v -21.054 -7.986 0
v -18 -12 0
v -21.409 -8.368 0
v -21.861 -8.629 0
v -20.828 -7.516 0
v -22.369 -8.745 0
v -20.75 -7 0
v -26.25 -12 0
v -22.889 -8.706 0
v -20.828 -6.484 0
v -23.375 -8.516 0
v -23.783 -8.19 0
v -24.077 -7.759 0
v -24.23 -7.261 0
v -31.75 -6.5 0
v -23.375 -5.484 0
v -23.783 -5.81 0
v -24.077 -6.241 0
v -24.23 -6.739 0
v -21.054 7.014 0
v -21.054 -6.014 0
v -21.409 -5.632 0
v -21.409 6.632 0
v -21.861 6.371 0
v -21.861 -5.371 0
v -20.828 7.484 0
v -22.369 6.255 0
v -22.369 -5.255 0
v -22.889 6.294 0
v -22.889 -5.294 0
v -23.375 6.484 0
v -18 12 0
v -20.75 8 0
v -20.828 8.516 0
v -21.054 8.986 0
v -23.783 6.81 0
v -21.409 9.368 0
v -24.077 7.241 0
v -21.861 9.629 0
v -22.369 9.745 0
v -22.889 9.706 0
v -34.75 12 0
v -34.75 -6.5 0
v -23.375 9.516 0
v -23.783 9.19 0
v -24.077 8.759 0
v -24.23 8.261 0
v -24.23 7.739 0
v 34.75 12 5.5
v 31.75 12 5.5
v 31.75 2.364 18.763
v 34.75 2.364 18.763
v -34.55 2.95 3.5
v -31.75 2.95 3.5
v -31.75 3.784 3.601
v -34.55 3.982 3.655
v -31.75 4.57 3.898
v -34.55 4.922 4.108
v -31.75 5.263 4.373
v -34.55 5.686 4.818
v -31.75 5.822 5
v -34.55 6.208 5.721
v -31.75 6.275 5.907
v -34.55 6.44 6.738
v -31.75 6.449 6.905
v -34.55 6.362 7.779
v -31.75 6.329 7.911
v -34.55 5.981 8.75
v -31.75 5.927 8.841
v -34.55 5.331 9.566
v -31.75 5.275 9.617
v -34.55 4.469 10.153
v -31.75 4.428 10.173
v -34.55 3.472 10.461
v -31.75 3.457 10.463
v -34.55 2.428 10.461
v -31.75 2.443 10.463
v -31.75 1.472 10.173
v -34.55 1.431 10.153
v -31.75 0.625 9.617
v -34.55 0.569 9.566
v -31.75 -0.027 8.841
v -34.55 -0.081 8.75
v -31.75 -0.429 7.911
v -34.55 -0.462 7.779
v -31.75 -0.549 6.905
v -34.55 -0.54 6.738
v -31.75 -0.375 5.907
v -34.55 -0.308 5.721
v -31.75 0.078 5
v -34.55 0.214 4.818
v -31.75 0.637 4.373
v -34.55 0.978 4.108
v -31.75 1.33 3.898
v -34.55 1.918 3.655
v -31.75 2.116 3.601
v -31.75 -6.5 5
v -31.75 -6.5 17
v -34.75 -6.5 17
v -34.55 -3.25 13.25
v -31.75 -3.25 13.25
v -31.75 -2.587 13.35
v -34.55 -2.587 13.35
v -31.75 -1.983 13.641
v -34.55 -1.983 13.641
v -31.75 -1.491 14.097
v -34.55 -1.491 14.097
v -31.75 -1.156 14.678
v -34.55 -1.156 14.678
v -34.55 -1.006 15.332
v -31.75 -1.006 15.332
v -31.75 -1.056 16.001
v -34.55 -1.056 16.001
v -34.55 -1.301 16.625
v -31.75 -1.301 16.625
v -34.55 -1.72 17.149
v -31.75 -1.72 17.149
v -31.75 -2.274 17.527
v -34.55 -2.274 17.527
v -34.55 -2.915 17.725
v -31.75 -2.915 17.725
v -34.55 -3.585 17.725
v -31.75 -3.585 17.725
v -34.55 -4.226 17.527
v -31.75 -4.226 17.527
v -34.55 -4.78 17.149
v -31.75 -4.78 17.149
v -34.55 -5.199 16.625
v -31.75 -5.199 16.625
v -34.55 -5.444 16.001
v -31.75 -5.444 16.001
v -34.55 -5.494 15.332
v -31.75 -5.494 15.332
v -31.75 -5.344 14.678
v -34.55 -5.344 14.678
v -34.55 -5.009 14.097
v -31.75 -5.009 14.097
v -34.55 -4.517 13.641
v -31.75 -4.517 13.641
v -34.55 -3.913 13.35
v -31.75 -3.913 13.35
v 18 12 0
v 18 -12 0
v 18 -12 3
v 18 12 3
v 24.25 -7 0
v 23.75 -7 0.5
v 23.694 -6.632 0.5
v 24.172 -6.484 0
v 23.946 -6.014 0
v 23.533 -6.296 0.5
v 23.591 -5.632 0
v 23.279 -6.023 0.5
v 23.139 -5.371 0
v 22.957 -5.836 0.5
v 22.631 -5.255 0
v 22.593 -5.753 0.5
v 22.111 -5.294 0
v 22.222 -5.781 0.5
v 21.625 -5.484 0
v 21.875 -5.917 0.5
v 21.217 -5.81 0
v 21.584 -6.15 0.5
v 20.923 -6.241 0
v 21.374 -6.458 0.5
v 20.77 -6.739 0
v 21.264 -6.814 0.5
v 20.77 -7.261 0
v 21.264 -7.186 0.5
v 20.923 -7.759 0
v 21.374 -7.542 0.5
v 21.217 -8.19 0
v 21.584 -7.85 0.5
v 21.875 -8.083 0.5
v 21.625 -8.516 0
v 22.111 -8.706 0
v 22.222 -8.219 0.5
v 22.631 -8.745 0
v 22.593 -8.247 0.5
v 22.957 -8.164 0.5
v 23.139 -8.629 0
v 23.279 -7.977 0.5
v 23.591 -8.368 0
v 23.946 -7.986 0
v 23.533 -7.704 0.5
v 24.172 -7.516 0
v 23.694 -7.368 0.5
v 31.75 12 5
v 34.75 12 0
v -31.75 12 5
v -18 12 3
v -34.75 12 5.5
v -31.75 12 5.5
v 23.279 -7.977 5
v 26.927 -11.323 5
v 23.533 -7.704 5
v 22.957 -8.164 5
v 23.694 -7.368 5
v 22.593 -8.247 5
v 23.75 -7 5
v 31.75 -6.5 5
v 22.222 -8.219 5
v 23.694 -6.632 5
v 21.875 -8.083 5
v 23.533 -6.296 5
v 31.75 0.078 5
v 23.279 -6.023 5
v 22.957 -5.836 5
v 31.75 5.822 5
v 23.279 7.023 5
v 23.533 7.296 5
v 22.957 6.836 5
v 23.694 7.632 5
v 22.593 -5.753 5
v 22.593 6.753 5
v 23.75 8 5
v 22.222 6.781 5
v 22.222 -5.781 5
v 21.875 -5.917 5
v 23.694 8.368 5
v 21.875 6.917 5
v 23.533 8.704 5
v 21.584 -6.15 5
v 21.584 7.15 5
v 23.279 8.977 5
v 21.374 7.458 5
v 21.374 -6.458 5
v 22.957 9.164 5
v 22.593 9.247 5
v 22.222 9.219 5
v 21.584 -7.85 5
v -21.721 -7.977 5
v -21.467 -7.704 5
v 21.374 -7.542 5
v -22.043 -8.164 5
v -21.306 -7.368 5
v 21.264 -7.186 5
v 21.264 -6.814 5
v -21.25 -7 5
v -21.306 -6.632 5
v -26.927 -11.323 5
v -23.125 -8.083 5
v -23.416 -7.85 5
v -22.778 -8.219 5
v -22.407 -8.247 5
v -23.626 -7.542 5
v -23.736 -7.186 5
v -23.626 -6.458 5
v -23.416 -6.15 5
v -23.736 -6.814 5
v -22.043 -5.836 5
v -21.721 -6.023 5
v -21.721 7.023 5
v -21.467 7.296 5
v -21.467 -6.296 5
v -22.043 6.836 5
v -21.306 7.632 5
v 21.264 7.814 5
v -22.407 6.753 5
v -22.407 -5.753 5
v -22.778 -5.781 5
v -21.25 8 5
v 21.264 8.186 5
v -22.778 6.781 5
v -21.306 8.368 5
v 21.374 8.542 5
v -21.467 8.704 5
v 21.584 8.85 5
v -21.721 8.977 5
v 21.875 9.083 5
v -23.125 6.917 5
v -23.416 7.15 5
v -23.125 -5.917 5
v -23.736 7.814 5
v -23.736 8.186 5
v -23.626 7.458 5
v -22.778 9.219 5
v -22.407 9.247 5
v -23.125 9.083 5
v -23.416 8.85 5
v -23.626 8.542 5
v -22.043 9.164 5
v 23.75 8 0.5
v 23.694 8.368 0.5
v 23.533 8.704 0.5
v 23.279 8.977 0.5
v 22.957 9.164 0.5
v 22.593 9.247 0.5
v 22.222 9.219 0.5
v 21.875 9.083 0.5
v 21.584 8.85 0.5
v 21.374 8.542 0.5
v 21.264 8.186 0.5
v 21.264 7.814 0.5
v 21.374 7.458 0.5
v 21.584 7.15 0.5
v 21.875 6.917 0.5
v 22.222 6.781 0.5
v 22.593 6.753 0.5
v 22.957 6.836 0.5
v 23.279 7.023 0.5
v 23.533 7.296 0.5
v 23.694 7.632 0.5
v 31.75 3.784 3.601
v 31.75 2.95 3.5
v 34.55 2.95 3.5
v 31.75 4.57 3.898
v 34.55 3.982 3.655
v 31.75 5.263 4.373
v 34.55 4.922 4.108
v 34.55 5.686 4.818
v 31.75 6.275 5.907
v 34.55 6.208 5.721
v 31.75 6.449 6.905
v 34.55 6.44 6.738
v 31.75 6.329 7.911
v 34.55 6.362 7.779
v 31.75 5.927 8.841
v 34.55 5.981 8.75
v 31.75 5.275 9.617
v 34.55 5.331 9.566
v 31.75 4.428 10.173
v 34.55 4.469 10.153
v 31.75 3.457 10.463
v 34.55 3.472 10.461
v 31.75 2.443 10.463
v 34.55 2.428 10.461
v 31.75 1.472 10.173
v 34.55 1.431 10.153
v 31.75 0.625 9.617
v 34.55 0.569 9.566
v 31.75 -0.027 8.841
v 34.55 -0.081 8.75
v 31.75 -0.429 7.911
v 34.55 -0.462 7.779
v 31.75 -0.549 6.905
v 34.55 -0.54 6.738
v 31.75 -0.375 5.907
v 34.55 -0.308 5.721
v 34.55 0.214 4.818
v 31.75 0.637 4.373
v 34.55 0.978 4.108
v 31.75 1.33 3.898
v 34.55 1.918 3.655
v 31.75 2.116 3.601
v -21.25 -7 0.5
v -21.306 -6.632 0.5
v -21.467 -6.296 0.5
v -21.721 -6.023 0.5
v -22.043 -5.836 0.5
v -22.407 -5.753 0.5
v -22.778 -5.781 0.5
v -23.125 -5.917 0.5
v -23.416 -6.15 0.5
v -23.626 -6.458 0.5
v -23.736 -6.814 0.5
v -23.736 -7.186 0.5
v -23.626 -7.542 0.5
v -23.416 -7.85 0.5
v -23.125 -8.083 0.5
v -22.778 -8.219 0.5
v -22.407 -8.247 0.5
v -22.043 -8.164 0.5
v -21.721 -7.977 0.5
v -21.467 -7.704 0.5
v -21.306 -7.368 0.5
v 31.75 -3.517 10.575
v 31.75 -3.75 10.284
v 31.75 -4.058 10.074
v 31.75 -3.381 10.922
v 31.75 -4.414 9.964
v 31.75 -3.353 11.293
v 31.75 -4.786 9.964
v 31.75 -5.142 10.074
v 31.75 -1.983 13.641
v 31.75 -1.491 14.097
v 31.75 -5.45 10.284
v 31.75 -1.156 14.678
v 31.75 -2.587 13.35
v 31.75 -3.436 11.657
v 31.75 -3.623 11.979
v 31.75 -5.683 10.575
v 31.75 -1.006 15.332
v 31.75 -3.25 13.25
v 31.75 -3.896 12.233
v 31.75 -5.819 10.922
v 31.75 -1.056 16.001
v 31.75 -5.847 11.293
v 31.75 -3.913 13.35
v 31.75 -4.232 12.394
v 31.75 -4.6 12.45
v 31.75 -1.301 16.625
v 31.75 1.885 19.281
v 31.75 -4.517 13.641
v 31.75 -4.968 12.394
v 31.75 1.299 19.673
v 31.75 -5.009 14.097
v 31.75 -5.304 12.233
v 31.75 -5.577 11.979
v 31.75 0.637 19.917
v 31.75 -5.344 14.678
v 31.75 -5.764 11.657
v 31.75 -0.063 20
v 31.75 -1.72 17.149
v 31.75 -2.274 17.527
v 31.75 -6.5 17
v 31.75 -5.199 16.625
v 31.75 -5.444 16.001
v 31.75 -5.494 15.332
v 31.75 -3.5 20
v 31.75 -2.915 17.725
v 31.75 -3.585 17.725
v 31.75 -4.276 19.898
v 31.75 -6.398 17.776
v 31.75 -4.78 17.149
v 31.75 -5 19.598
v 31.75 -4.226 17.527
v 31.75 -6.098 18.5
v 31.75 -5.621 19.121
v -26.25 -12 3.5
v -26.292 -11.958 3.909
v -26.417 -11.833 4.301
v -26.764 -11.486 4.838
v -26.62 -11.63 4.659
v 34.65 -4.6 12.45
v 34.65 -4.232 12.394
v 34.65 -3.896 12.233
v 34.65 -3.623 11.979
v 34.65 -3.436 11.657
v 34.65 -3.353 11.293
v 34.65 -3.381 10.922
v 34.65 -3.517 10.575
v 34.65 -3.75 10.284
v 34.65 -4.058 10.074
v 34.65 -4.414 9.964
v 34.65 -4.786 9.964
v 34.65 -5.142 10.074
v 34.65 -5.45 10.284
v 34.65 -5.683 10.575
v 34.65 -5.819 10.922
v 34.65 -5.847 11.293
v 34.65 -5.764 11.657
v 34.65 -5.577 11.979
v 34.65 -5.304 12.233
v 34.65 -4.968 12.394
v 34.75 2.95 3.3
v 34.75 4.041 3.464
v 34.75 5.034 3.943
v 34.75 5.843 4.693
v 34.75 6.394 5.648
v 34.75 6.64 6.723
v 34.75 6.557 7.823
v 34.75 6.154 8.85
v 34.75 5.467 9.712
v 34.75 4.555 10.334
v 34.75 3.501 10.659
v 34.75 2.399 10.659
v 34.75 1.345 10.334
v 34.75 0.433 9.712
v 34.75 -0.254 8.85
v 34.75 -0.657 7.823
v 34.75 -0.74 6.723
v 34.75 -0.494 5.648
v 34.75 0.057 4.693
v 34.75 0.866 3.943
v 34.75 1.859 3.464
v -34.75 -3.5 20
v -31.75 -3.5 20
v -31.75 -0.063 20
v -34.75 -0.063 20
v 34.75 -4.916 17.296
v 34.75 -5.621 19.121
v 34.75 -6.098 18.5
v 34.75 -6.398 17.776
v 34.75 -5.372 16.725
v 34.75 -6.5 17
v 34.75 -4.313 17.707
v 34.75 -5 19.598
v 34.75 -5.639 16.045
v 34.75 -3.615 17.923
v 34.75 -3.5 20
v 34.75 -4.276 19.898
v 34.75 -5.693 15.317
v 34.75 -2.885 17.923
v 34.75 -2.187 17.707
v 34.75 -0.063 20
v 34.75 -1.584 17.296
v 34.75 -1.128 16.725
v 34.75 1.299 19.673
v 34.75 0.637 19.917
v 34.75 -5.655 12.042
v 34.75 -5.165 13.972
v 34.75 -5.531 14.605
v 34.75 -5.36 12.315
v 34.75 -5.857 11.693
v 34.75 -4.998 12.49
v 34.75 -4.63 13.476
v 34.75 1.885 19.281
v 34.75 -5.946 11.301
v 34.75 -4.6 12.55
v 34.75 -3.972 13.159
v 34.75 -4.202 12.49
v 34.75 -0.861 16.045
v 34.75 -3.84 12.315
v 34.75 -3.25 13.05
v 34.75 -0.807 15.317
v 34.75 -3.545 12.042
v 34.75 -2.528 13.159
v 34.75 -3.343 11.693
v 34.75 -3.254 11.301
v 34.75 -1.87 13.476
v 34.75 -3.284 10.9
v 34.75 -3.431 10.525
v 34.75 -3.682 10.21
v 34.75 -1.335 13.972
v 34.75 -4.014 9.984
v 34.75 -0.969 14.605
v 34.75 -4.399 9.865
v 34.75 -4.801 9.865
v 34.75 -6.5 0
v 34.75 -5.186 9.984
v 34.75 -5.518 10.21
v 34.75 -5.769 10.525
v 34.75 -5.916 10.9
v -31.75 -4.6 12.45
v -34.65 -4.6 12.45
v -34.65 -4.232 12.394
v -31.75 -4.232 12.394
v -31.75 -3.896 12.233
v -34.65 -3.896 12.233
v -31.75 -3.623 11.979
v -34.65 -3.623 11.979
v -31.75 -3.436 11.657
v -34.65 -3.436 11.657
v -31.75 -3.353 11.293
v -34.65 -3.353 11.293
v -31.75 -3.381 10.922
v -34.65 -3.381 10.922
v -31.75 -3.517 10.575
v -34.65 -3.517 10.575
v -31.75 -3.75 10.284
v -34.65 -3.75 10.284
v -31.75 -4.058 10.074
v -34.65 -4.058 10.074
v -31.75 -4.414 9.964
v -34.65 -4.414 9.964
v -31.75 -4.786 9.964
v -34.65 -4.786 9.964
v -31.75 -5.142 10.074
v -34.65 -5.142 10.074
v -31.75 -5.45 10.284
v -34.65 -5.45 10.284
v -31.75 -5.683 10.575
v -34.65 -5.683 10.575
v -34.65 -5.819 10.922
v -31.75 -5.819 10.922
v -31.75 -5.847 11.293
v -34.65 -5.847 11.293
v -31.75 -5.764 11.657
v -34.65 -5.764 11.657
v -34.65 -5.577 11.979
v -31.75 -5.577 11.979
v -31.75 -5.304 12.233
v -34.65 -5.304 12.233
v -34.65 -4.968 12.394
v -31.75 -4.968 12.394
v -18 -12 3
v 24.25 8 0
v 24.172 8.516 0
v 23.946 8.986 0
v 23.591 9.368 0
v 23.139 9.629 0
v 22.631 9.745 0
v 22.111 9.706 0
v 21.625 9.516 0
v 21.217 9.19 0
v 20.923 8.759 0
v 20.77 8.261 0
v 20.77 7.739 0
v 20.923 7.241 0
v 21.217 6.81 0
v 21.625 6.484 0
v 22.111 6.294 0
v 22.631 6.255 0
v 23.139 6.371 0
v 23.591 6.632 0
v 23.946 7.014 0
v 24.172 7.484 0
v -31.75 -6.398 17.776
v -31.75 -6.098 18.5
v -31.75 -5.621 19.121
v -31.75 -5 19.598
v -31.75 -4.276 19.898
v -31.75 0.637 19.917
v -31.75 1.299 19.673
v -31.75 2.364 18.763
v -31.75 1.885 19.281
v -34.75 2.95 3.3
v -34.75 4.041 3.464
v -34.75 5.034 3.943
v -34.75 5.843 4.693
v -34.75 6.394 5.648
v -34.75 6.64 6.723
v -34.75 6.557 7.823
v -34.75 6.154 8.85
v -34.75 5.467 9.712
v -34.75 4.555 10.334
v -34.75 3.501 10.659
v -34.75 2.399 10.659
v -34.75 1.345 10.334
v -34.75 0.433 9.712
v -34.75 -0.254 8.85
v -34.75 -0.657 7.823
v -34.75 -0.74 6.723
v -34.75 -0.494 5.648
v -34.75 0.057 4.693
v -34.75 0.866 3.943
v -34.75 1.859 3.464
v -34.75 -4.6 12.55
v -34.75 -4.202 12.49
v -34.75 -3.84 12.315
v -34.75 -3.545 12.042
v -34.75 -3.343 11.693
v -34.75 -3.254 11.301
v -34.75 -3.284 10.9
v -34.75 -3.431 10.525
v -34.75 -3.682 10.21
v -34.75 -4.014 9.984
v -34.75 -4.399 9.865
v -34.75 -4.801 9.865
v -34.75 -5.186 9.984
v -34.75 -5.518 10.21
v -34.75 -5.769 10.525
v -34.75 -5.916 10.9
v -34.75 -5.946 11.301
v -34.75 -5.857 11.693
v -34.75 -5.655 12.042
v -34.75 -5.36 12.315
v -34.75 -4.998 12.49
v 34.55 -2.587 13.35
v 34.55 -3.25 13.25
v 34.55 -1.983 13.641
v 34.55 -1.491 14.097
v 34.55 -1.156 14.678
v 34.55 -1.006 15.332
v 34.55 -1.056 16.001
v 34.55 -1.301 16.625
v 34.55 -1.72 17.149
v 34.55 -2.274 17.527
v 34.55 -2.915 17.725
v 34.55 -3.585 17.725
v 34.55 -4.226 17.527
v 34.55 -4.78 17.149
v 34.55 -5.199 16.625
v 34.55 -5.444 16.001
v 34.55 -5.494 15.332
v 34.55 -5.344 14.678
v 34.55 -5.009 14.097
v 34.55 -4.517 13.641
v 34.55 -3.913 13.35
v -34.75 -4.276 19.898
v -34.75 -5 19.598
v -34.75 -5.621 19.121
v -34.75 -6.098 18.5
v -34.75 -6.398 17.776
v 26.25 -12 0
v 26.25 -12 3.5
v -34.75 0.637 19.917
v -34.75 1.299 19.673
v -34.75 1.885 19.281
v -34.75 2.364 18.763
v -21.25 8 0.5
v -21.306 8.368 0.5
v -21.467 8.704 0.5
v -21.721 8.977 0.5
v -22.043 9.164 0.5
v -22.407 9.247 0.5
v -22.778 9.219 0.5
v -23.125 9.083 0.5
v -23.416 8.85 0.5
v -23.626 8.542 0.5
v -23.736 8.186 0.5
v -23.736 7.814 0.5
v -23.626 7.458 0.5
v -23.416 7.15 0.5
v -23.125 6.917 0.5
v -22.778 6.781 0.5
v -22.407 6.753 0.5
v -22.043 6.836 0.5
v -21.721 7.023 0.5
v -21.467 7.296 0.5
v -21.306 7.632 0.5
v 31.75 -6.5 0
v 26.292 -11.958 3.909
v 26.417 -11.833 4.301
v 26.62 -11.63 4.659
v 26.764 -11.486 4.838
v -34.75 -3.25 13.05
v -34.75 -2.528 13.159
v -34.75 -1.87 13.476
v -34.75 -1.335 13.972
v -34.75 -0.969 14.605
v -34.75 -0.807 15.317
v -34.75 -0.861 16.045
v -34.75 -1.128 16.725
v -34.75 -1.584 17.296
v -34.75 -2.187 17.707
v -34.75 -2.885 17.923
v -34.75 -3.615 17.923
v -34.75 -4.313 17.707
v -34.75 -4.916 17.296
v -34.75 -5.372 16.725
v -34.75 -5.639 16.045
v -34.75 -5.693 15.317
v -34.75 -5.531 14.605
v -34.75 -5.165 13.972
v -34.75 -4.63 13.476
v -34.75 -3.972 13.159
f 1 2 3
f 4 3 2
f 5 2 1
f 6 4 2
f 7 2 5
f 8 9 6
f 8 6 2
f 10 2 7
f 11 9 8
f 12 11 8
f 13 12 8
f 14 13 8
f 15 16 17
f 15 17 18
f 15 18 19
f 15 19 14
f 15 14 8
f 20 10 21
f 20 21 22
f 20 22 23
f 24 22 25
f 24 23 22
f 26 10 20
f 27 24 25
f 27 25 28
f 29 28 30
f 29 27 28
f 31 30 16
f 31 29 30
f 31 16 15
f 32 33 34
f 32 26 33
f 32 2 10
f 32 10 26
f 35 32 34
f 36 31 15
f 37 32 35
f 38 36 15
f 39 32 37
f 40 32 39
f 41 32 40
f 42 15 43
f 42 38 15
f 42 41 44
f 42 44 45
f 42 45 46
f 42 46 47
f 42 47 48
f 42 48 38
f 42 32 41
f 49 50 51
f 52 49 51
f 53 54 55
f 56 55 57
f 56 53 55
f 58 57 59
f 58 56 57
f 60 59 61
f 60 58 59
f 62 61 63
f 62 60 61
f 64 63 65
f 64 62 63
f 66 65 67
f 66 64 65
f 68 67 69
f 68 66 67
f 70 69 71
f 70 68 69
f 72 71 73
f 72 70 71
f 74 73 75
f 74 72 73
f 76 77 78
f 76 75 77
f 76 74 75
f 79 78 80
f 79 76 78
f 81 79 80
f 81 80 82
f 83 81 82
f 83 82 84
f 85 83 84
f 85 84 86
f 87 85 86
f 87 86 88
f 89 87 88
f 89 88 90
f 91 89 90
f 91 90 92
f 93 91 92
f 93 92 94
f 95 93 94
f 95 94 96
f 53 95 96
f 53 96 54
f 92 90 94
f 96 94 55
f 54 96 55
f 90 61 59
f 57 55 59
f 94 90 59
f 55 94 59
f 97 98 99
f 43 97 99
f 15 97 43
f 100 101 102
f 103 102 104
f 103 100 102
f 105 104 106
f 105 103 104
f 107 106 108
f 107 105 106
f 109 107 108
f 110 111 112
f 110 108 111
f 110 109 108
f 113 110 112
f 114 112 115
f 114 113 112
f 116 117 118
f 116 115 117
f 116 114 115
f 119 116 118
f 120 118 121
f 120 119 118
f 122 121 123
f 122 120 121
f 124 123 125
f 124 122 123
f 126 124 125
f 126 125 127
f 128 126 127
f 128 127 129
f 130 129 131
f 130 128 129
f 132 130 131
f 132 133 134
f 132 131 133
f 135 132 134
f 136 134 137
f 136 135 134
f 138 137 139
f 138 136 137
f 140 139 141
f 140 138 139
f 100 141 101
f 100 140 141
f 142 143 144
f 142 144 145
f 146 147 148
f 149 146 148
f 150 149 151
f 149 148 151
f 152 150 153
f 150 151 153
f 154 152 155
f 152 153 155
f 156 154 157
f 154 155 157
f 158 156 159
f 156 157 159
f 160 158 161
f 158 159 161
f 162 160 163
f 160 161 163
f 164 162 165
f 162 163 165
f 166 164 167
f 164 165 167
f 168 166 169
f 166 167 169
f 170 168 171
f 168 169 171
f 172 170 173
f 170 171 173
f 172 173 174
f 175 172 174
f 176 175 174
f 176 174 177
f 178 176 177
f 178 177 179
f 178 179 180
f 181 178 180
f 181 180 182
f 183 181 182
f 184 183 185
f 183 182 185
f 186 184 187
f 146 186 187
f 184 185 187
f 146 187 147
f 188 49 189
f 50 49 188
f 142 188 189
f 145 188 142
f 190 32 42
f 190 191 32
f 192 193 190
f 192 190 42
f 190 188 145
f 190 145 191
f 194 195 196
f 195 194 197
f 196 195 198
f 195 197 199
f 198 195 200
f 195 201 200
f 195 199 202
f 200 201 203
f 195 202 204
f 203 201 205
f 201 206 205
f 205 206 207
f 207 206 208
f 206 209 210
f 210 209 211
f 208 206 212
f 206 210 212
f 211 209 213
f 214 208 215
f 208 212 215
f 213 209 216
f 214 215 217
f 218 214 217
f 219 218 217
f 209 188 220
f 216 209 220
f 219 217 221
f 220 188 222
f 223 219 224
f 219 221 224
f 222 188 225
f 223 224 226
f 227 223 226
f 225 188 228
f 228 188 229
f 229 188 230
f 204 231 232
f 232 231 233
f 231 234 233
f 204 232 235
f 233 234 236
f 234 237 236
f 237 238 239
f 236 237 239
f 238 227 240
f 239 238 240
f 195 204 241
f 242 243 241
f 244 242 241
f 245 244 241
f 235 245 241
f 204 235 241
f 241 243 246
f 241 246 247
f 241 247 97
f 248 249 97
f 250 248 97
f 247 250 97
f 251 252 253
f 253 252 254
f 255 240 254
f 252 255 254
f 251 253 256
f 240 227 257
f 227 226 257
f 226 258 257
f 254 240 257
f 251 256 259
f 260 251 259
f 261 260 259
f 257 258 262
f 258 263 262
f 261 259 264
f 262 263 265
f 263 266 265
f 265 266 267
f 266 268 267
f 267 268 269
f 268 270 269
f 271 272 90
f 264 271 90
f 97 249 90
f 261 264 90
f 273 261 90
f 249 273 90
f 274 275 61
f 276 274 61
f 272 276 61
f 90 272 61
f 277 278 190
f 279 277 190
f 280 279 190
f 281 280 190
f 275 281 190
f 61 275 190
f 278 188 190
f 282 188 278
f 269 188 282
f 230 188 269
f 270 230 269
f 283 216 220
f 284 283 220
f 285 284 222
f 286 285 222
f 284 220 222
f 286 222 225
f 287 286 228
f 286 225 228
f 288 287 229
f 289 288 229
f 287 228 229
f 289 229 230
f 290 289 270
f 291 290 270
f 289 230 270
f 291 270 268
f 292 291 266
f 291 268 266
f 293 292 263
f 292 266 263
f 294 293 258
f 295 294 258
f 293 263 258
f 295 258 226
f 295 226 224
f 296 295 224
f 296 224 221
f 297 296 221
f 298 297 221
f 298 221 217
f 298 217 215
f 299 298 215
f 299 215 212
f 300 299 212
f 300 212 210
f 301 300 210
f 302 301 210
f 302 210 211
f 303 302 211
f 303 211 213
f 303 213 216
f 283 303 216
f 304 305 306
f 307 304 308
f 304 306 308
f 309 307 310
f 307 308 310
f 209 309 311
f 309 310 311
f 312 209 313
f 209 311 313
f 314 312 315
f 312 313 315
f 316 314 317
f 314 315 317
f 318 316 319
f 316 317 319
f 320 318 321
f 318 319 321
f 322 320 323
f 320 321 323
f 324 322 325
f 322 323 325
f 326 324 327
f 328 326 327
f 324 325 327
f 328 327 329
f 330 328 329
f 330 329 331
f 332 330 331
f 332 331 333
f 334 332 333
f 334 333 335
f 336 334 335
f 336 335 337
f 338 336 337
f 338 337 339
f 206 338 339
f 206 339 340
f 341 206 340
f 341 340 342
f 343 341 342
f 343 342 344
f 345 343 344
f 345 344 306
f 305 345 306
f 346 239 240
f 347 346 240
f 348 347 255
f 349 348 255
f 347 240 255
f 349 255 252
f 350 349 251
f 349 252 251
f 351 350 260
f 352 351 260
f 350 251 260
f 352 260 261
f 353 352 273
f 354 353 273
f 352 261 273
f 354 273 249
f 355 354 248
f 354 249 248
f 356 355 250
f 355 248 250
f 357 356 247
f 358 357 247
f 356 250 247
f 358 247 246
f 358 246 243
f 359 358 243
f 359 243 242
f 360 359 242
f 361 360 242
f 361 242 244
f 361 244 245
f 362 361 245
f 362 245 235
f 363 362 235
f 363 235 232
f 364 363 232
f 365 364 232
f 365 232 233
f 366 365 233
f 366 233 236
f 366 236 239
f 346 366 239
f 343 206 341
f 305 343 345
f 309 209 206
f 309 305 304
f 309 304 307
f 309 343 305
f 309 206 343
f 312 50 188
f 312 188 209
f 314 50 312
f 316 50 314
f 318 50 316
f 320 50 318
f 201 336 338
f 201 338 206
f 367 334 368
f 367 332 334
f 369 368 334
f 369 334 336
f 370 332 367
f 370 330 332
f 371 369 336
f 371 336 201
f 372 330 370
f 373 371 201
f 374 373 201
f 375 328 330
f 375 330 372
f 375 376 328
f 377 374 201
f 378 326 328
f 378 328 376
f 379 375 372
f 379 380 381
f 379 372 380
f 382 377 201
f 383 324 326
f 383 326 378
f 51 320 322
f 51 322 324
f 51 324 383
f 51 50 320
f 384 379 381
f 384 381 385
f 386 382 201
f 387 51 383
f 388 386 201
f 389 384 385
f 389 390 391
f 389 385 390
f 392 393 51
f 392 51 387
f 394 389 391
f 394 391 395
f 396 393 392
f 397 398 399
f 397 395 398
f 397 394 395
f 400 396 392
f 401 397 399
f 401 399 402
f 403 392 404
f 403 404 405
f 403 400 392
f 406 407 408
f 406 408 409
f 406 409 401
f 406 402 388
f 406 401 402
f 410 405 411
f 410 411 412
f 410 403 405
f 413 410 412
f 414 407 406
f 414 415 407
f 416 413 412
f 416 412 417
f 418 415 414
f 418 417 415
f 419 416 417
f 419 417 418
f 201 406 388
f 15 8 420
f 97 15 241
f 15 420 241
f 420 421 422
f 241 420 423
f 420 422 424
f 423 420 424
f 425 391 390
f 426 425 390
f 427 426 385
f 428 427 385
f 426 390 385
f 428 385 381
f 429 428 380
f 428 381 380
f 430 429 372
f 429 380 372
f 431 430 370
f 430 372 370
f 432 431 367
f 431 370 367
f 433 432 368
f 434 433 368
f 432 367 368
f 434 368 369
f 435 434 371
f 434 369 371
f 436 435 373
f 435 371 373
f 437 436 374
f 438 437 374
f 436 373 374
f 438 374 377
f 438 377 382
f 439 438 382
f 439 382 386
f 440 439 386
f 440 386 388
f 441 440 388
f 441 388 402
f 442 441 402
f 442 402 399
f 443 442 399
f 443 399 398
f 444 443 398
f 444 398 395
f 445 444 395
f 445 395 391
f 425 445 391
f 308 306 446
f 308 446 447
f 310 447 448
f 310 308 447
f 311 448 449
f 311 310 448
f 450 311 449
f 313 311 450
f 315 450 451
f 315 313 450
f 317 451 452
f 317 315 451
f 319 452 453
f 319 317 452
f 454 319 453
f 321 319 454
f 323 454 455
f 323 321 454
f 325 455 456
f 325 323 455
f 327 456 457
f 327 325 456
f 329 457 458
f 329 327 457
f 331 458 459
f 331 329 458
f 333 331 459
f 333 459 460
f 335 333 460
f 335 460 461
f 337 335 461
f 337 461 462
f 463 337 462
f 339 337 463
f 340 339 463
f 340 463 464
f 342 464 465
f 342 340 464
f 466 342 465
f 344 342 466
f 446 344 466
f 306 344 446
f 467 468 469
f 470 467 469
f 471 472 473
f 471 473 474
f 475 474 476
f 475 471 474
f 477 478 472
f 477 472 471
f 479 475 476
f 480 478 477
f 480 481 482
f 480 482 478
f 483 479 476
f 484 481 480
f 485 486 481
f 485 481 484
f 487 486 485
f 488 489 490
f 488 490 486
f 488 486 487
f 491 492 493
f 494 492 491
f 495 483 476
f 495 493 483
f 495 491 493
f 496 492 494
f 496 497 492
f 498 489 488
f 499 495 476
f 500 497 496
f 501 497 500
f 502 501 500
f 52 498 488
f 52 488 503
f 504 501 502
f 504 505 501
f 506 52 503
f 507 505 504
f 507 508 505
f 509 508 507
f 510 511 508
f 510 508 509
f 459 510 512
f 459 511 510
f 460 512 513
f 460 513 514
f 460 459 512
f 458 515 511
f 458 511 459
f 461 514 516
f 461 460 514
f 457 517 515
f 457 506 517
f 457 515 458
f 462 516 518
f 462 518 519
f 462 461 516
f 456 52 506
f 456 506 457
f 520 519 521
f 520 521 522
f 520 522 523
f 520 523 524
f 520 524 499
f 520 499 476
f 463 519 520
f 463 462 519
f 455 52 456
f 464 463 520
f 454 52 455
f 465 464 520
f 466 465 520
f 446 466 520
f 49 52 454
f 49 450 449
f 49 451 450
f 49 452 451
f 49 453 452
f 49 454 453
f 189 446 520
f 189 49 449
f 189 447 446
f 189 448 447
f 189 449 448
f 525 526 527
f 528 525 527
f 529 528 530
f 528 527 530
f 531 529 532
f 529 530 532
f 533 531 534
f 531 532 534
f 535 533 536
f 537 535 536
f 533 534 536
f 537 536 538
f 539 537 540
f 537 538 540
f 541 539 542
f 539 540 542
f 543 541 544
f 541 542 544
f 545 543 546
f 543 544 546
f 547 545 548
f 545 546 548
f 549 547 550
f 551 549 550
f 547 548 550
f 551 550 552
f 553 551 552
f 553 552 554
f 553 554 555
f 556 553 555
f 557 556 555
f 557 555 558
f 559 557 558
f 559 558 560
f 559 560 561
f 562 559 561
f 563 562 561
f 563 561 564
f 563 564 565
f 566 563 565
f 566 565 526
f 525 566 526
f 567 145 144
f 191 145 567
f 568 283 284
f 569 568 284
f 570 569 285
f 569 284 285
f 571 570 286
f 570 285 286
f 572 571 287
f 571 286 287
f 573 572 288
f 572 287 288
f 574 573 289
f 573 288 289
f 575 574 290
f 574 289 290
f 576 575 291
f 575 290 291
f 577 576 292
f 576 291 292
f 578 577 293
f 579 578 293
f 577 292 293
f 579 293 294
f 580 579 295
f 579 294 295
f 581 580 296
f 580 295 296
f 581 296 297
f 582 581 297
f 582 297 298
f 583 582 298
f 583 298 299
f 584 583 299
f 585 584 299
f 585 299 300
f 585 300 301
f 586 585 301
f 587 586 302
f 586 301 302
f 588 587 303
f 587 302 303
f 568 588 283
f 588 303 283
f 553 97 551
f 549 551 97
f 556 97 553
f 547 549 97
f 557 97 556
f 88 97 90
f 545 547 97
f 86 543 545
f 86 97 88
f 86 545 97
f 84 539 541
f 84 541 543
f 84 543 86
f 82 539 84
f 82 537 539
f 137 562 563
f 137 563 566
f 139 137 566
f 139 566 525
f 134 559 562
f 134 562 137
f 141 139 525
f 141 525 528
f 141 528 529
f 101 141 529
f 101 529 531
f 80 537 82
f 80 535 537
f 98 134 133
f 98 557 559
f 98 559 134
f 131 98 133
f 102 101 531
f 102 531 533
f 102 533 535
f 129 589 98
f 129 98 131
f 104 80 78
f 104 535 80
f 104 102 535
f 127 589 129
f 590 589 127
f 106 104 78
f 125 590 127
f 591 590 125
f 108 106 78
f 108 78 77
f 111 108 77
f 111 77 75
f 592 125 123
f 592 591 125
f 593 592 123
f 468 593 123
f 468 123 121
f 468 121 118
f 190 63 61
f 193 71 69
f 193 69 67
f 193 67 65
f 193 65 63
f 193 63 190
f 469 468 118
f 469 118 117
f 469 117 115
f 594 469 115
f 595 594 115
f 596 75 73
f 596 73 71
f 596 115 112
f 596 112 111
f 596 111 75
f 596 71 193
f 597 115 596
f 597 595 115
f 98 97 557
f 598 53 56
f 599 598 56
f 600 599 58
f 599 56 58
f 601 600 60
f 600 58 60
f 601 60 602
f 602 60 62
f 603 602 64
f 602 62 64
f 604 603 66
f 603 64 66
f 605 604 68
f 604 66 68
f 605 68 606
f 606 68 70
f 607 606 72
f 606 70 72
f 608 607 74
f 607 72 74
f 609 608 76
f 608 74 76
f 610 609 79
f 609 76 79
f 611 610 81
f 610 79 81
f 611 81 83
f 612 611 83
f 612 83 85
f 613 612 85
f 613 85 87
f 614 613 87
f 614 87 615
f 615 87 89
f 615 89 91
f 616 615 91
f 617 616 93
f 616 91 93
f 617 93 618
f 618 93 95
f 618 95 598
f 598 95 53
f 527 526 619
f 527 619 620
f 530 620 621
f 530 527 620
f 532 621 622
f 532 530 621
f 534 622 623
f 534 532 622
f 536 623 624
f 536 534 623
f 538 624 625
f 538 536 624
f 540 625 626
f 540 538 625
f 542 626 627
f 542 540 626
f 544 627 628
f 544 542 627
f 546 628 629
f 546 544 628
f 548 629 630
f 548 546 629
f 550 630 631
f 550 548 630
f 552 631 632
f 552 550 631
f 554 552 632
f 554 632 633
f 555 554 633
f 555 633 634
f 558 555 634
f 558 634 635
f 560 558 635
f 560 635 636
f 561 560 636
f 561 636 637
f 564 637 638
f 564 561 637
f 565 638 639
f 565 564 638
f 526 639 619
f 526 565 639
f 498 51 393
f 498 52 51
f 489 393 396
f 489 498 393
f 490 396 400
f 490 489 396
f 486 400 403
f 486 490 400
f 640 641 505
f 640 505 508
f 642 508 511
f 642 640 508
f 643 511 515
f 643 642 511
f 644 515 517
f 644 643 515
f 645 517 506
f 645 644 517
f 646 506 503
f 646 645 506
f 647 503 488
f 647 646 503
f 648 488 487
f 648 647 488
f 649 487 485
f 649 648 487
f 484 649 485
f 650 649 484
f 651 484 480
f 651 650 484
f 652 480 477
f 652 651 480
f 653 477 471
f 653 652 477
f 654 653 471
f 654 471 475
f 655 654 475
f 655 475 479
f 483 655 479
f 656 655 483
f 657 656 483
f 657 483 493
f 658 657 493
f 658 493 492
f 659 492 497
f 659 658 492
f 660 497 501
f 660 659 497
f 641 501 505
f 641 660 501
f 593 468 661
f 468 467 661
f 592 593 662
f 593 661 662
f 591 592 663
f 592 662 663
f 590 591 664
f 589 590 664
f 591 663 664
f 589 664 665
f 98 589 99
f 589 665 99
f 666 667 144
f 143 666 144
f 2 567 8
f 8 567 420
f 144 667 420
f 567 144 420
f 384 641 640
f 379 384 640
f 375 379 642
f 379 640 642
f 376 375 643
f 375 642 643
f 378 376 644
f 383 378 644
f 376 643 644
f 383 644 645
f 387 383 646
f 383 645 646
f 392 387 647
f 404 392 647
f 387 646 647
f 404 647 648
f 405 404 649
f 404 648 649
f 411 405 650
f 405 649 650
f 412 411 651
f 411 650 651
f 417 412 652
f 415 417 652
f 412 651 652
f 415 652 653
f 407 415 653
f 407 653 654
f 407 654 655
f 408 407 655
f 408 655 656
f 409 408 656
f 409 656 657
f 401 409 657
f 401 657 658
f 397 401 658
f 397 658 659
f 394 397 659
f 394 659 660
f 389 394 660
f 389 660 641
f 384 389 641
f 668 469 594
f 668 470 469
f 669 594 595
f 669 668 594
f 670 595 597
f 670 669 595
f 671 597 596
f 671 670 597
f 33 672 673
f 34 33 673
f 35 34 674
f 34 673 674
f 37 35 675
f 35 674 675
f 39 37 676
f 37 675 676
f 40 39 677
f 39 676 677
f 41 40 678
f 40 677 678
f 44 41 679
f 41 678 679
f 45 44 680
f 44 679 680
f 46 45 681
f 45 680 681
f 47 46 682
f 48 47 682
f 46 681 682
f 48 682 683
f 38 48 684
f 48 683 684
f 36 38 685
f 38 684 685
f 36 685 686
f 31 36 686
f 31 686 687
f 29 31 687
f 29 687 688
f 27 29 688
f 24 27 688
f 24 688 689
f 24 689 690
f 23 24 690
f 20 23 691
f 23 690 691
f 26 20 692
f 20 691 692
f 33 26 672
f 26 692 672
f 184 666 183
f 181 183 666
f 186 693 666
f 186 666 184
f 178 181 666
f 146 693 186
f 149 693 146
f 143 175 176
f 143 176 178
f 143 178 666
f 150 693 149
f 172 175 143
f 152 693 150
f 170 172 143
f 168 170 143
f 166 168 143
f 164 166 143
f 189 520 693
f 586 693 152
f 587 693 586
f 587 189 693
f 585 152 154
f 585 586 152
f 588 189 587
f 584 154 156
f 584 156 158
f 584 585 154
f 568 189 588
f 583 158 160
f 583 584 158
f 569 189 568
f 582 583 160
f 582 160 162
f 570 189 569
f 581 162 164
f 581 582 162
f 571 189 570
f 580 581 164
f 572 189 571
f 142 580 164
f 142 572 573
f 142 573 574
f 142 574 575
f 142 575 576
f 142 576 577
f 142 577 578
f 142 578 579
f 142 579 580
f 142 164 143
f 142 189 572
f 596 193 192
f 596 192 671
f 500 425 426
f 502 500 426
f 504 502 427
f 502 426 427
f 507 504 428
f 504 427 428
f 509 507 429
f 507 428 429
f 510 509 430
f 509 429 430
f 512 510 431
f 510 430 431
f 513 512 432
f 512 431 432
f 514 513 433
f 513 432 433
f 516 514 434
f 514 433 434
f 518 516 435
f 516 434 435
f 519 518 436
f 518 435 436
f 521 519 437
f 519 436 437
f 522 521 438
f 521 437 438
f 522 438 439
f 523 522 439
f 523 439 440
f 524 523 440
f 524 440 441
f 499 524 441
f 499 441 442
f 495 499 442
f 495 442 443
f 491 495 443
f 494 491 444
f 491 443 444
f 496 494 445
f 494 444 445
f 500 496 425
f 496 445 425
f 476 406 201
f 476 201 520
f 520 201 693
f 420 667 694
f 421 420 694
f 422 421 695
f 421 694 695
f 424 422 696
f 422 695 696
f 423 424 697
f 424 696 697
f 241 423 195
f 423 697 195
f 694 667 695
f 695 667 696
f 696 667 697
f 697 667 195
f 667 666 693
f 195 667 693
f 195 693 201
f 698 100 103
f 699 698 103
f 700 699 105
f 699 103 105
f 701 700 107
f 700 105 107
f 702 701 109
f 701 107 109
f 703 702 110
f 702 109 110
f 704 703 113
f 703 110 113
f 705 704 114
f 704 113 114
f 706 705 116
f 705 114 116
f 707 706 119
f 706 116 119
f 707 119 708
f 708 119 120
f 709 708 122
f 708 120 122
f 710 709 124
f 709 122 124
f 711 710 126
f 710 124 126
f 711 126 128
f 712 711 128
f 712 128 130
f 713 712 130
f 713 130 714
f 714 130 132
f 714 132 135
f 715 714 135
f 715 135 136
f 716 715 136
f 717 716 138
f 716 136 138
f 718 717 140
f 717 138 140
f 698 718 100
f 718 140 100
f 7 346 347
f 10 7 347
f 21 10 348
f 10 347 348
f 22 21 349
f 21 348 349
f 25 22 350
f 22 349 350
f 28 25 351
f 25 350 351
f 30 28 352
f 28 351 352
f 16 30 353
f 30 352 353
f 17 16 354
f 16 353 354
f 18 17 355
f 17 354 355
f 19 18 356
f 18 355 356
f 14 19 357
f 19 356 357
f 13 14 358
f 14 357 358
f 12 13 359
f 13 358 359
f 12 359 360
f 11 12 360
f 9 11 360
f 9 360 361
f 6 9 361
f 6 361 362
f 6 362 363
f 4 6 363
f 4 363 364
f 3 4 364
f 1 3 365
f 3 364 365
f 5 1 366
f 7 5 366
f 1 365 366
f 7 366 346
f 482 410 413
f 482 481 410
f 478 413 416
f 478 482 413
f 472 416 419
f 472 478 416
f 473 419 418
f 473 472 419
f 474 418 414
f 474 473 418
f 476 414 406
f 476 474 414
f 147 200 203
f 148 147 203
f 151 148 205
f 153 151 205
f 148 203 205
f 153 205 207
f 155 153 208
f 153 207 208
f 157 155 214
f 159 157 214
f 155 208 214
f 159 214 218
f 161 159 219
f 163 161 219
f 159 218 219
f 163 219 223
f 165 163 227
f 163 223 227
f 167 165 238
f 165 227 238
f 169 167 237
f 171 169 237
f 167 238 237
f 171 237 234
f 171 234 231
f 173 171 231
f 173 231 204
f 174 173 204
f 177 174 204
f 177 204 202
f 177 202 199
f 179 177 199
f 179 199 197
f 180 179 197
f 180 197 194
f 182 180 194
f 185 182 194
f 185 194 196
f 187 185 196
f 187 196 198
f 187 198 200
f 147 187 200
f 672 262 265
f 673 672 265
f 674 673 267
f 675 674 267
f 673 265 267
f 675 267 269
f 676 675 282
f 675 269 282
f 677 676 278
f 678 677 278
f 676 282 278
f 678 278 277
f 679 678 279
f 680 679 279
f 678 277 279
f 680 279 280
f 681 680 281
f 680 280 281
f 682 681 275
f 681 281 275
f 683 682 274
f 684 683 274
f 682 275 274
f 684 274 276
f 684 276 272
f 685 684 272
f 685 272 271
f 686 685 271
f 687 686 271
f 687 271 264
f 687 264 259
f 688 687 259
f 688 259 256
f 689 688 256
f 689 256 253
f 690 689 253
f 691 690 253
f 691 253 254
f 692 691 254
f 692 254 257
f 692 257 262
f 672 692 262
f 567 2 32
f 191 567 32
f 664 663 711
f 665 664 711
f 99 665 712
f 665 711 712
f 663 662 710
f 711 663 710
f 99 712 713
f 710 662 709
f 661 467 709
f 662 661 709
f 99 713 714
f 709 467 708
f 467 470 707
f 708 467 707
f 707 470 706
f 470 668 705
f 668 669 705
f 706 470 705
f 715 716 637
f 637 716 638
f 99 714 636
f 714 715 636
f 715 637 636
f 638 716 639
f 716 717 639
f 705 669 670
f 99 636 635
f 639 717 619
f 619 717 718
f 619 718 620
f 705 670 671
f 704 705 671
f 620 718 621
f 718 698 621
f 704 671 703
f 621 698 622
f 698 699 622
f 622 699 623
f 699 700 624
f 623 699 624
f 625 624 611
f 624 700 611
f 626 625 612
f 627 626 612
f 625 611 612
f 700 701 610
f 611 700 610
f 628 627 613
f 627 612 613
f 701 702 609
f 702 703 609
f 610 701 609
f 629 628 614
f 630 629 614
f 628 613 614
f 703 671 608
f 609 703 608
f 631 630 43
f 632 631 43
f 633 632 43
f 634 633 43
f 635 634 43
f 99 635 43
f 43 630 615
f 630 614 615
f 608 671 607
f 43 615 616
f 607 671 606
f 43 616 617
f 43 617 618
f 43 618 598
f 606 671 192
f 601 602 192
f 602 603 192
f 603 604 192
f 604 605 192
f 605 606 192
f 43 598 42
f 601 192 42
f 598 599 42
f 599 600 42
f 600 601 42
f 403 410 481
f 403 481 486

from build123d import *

# Parameters (mm, degrees)
SKETCH_1_W             = 63.5
SKETCH_1_H             = 24
EXTRUDE_1_DEPTH        = 5.5
SKETCH_2_W             = 35
SKETCH_2_H             = 3
CUT_EXTRUDE_2_DEPTH    = 24
HOLE_WIZARD_M3_1_D     = 2.5
HOLE_WIZARD_M3_1_DEPTH = 7.5
HOLE_WIZARD_M3_1_TIP   = 0.751075774
CHAMFER_1_SIZE         = 0.5
CHAMFER_2_SIZE         = 0.5
CHAMFER_3_SIZE         = 5.5
SKETCH_7_W             = 20
SKETCH_7_H             = 18.5
EXTRUDE_1_2_DEPTH      = 3
SKETCH_8_R             = 3.5
CUT_EXTRUDE_1_DEPTH    = 3
SKETCH_9_R             = 2.25
CUT_EXTRUDE_2_2_DEPTH  = 87
CUT_EXTRUDE_4_DEPTH    = 10
FILLET_1_R             = 3
CHAMFER_5_SIZE         = 0.2
FILLET_3_R             = 2
SKETCH_11_R            = 1.25
CUT_EXTRUDE_5_DEPTH    = 96
CHAMFER_6_SIZE         = 0.1
SKETCH_12_W            = 35
SKETCH_12_H            = 24
EXTRUDE_2_DEPTH        = 3
SKETCH_13_W            = 36
SKETCH_13_H            = 24
CUT_EXTRUDE_6_DEPTH    = 3
CUT_EXTRUDE_7_DEPTH    = 0.5


with BuildPart() as part:
    # 草图1 → Extrude 1 (new body)
    with BuildSketch(Plane.XY):
        Rectangle(SKETCH_1_W, SKETCH_1_H)
    extrude(amount=EXTRUDE_1_DEPTH)

    # 草图2 → Cut-Extrude 2 (cut)
    with BuildSketch(Plane.XZ.offset(12)):
        with Locations((0, 1.5)):
            Rectangle(SKETCH_2_W, SKETCH_2_H)
    extrude(amount=-CUT_EXTRUDE_2_DEPTH, mode=Mode.SUBTRACT)

    # M3 螺纹孔1
    with Locations(Plane(origin=(22.5, 8, 0), x_dir=(-1, 0, 0), z_dir=(0, 0, -1))):
        with Locations((0, 0), (0, -15), (45, -15), (45, 0)):
            Hole(HOLE_WIZARD_M3_1_D / 2, depth=HOLE_WIZARD_M3_1_DEPTH)
            with Locations((0, 0, -(HOLE_WIZARD_M3_1_DEPTH + HOLE_WIZARD_M3_1_TIP / 2))):  # 118° drill point
                Cone(0, HOLE_WIZARD_M3_1_D / 2, HOLE_WIZARD_M3_1_TIP, mode=Mode.SUBTRACT)

    # 倒角1
    chamfer_1_edges = [part.edges().sort_by_distance(p)[0] for p in [
        (-23.75, 8, 0),
        (-23.75, -7, 0),
        (21.25, -7, 0),
        (21.25, 8, 0),
    ]]
    chamfer(chamfer_1_edges, length=CHAMFER_1_SIZE)

    # 倒角2
    chamfer_2_edges = [part.edges().sort_by_distance(p)[0] for p in [
        (-23.75, 8, 5.5),
        (-23.75, -7, 5.5),
        (21.25, -7, 5.5),
        (21.25, 8, 5.5),
    ]]
    chamfer(chamfer_2_edges, length=CHAMFER_2_SIZE)

    # 倒角3
    chamfer_3_edges = [part.edges().sort_by_distance(p)[0] for p in [
        (31.75, -12, 2.75),
        (-31.75, -12, 2.75),
    ]]
    chamfer(chamfer_3_edges, length=CHAMFER_3_SIZE)

    # 草图7 → Extrude 1 2 (add)
    with BuildSketch(Plane(origin=(31.75, 0, 0), x_dir=(0, 0, -1), z_dir=(1, 0, 0))):
        with Locations((-10, 2.75)):
            Rectangle(SKETCH_7_W, SKETCH_7_H)
    extrude_1_2 = extrude(amount=EXTRUDE_1_2_DEPTH)

    # 草图8 → 切除-拉伸1 (cut)
    with BuildSketch(Plane(origin=(34.75, 0, 0), x_dir=(0, 0, -1), z_dir=(1, 0, 0))):
        with Locations((-7, 2.95)):
            Circle(SKETCH_8_R)
    cut_extrude_1 = extrude(amount=-CUT_EXTRUDE_1_DEPTH, mode=Mode.SUBTRACT)

    # 草图9 → Cut-Extrude 2 2 (cut)
    with BuildSketch(Plane(origin=(34.75, 0, 0), x_dir=(0, 0, -1), z_dir=(1, 0, 0))):
        with Locations((-15.5, -3.25)):
            Circle(SKETCH_9_R)
    cut_extrude_2_2 = extrude(amount=-CUT_EXTRUDE_2_2_DEPTH, mode=Mode.SUBTRACT)

    # 草图10 → 切除-拉伸4 (cut)
    with BuildSketch(Plane(origin=(31.75, 0, 0), x_dir=(0, 0, -1), z_dir=(1, 0, 0))):
        Polygon((-20, 1.465133344), (-20, 12), (-5.5, 12), align=None)
    cut_extrude_4 = extrude(amount=CUT_EXTRUDE_4_DEPTH, mode=Mode.SUBTRACT)

    # 镜向2: Extrude 1 2, 切除-拉伸1, Cut-Extrude 2 2, 切除-拉伸4 across plane
    add(extrude_1_2.mirror(Plane(origin=(0, 0, 0), x_dir=(0, 0, 1), z_dir=(1, 0, 0))))
    add(cut_extrude_1.mirror(Plane(origin=(0, 0, 0), x_dir=(0, 0, 1), z_dir=(1, 0, 0))), mode=Mode.SUBTRACT)
    add(cut_extrude_2_2.mirror(Plane(origin=(0, 0, 0), x_dir=(0, 0, 1), z_dir=(1, 0, 0))), mode=Mode.SUBTRACT)
    add(cut_extrude_4.mirror(Plane(origin=(0, 0, 0), x_dir=(0, 0, 1), z_dir=(1, 0, 0))), mode=Mode.SUBTRACT)

    # 圆角1
    fillet_1_edges = [part.edges().sort_by_distance(p)[0] for p in [
        (33.25, -6.5, 20),
        (33.25, 1.465133344, 20),
        (-33.25, 1.465133344, 20),
        (-33.25, -6.5, 20),
    ]]
    fillet(fillet_1_edges, radius=FILLET_1_R)

    # 倒角5
    chamfer_5_edges = [part.edges().sort_by_distance(p)[0] for p in [
        (34.75, 2.95, 10.5),
        (34.75, -3.25, 17.75),
        (-34.75, 2.95, 10.5),
        (-34.75, -3.25, 17.75),
    ]]
    chamfer(chamfer_5_edges, length=CHAMFER_5_SIZE)

    # 圆角3
    fillet_3_edges = [part.edges().sort_by_distance(p)[0] for p in [
        (0, -12, 5.5),
    ]]
    fillet(fillet_3_edges, radius=FILLET_3_R)

    # 草图11 → 切除-拉伸5 (cut)
    with BuildSketch(Plane.ZY.offset(34.75)):
        with Locations((11.2, -4.6)):
            Circle(SKETCH_11_R)
    extrude(amount=-CUT_EXTRUDE_5_DEPTH, mode=Mode.SUBTRACT)

    # 倒角6
    chamfer_6_edges = [part.edges().sort_by_distance(p)[0] for p in [
        (34.75, -4.6, 9.95),
        (-34.75, -4.6, 9.95),
    ]]
    chamfer(chamfer_6_edges, length=CHAMFER_6_SIZE)

    # 草图12 → 凸台-拉伸2 (add)
    with BuildSketch(Plane(origin=(0, 0, 3), x_dir=(-1, 0, 0), z_dir=(0, 0, -1))):
        Rectangle(SKETCH_12_W, SKETCH_12_H)
    extrude(amount=EXTRUDE_2_DEPTH)

    # 草图13 → 切除-拉伸6 (cut)
    with BuildSketch(Plane(origin=(0, 0, 0), x_dir=(-1, 0, 0), z_dir=(0, 0, -1))):
        Rectangle(SKETCH_13_W, SKETCH_13_H)
    extrude(amount=-CUT_EXTRUDE_6_DEPTH, mode=Mode.SUBTRACT)

    # 草图14 → 切除-拉伸7 (cut)
    with BuildSketch(Plane.XY.offset(5.5)):
        Polygon((31.75, -6.5), (25.25, -13), (-25.25, -13), (-31.75, -6.5), (-31.75, 12), (31.75, 12), align=None)
    extrude(amount=-CUT_EXTRUDE_7_DEPTH, mode=Mode.SUBTRACT)


solid = part.part
